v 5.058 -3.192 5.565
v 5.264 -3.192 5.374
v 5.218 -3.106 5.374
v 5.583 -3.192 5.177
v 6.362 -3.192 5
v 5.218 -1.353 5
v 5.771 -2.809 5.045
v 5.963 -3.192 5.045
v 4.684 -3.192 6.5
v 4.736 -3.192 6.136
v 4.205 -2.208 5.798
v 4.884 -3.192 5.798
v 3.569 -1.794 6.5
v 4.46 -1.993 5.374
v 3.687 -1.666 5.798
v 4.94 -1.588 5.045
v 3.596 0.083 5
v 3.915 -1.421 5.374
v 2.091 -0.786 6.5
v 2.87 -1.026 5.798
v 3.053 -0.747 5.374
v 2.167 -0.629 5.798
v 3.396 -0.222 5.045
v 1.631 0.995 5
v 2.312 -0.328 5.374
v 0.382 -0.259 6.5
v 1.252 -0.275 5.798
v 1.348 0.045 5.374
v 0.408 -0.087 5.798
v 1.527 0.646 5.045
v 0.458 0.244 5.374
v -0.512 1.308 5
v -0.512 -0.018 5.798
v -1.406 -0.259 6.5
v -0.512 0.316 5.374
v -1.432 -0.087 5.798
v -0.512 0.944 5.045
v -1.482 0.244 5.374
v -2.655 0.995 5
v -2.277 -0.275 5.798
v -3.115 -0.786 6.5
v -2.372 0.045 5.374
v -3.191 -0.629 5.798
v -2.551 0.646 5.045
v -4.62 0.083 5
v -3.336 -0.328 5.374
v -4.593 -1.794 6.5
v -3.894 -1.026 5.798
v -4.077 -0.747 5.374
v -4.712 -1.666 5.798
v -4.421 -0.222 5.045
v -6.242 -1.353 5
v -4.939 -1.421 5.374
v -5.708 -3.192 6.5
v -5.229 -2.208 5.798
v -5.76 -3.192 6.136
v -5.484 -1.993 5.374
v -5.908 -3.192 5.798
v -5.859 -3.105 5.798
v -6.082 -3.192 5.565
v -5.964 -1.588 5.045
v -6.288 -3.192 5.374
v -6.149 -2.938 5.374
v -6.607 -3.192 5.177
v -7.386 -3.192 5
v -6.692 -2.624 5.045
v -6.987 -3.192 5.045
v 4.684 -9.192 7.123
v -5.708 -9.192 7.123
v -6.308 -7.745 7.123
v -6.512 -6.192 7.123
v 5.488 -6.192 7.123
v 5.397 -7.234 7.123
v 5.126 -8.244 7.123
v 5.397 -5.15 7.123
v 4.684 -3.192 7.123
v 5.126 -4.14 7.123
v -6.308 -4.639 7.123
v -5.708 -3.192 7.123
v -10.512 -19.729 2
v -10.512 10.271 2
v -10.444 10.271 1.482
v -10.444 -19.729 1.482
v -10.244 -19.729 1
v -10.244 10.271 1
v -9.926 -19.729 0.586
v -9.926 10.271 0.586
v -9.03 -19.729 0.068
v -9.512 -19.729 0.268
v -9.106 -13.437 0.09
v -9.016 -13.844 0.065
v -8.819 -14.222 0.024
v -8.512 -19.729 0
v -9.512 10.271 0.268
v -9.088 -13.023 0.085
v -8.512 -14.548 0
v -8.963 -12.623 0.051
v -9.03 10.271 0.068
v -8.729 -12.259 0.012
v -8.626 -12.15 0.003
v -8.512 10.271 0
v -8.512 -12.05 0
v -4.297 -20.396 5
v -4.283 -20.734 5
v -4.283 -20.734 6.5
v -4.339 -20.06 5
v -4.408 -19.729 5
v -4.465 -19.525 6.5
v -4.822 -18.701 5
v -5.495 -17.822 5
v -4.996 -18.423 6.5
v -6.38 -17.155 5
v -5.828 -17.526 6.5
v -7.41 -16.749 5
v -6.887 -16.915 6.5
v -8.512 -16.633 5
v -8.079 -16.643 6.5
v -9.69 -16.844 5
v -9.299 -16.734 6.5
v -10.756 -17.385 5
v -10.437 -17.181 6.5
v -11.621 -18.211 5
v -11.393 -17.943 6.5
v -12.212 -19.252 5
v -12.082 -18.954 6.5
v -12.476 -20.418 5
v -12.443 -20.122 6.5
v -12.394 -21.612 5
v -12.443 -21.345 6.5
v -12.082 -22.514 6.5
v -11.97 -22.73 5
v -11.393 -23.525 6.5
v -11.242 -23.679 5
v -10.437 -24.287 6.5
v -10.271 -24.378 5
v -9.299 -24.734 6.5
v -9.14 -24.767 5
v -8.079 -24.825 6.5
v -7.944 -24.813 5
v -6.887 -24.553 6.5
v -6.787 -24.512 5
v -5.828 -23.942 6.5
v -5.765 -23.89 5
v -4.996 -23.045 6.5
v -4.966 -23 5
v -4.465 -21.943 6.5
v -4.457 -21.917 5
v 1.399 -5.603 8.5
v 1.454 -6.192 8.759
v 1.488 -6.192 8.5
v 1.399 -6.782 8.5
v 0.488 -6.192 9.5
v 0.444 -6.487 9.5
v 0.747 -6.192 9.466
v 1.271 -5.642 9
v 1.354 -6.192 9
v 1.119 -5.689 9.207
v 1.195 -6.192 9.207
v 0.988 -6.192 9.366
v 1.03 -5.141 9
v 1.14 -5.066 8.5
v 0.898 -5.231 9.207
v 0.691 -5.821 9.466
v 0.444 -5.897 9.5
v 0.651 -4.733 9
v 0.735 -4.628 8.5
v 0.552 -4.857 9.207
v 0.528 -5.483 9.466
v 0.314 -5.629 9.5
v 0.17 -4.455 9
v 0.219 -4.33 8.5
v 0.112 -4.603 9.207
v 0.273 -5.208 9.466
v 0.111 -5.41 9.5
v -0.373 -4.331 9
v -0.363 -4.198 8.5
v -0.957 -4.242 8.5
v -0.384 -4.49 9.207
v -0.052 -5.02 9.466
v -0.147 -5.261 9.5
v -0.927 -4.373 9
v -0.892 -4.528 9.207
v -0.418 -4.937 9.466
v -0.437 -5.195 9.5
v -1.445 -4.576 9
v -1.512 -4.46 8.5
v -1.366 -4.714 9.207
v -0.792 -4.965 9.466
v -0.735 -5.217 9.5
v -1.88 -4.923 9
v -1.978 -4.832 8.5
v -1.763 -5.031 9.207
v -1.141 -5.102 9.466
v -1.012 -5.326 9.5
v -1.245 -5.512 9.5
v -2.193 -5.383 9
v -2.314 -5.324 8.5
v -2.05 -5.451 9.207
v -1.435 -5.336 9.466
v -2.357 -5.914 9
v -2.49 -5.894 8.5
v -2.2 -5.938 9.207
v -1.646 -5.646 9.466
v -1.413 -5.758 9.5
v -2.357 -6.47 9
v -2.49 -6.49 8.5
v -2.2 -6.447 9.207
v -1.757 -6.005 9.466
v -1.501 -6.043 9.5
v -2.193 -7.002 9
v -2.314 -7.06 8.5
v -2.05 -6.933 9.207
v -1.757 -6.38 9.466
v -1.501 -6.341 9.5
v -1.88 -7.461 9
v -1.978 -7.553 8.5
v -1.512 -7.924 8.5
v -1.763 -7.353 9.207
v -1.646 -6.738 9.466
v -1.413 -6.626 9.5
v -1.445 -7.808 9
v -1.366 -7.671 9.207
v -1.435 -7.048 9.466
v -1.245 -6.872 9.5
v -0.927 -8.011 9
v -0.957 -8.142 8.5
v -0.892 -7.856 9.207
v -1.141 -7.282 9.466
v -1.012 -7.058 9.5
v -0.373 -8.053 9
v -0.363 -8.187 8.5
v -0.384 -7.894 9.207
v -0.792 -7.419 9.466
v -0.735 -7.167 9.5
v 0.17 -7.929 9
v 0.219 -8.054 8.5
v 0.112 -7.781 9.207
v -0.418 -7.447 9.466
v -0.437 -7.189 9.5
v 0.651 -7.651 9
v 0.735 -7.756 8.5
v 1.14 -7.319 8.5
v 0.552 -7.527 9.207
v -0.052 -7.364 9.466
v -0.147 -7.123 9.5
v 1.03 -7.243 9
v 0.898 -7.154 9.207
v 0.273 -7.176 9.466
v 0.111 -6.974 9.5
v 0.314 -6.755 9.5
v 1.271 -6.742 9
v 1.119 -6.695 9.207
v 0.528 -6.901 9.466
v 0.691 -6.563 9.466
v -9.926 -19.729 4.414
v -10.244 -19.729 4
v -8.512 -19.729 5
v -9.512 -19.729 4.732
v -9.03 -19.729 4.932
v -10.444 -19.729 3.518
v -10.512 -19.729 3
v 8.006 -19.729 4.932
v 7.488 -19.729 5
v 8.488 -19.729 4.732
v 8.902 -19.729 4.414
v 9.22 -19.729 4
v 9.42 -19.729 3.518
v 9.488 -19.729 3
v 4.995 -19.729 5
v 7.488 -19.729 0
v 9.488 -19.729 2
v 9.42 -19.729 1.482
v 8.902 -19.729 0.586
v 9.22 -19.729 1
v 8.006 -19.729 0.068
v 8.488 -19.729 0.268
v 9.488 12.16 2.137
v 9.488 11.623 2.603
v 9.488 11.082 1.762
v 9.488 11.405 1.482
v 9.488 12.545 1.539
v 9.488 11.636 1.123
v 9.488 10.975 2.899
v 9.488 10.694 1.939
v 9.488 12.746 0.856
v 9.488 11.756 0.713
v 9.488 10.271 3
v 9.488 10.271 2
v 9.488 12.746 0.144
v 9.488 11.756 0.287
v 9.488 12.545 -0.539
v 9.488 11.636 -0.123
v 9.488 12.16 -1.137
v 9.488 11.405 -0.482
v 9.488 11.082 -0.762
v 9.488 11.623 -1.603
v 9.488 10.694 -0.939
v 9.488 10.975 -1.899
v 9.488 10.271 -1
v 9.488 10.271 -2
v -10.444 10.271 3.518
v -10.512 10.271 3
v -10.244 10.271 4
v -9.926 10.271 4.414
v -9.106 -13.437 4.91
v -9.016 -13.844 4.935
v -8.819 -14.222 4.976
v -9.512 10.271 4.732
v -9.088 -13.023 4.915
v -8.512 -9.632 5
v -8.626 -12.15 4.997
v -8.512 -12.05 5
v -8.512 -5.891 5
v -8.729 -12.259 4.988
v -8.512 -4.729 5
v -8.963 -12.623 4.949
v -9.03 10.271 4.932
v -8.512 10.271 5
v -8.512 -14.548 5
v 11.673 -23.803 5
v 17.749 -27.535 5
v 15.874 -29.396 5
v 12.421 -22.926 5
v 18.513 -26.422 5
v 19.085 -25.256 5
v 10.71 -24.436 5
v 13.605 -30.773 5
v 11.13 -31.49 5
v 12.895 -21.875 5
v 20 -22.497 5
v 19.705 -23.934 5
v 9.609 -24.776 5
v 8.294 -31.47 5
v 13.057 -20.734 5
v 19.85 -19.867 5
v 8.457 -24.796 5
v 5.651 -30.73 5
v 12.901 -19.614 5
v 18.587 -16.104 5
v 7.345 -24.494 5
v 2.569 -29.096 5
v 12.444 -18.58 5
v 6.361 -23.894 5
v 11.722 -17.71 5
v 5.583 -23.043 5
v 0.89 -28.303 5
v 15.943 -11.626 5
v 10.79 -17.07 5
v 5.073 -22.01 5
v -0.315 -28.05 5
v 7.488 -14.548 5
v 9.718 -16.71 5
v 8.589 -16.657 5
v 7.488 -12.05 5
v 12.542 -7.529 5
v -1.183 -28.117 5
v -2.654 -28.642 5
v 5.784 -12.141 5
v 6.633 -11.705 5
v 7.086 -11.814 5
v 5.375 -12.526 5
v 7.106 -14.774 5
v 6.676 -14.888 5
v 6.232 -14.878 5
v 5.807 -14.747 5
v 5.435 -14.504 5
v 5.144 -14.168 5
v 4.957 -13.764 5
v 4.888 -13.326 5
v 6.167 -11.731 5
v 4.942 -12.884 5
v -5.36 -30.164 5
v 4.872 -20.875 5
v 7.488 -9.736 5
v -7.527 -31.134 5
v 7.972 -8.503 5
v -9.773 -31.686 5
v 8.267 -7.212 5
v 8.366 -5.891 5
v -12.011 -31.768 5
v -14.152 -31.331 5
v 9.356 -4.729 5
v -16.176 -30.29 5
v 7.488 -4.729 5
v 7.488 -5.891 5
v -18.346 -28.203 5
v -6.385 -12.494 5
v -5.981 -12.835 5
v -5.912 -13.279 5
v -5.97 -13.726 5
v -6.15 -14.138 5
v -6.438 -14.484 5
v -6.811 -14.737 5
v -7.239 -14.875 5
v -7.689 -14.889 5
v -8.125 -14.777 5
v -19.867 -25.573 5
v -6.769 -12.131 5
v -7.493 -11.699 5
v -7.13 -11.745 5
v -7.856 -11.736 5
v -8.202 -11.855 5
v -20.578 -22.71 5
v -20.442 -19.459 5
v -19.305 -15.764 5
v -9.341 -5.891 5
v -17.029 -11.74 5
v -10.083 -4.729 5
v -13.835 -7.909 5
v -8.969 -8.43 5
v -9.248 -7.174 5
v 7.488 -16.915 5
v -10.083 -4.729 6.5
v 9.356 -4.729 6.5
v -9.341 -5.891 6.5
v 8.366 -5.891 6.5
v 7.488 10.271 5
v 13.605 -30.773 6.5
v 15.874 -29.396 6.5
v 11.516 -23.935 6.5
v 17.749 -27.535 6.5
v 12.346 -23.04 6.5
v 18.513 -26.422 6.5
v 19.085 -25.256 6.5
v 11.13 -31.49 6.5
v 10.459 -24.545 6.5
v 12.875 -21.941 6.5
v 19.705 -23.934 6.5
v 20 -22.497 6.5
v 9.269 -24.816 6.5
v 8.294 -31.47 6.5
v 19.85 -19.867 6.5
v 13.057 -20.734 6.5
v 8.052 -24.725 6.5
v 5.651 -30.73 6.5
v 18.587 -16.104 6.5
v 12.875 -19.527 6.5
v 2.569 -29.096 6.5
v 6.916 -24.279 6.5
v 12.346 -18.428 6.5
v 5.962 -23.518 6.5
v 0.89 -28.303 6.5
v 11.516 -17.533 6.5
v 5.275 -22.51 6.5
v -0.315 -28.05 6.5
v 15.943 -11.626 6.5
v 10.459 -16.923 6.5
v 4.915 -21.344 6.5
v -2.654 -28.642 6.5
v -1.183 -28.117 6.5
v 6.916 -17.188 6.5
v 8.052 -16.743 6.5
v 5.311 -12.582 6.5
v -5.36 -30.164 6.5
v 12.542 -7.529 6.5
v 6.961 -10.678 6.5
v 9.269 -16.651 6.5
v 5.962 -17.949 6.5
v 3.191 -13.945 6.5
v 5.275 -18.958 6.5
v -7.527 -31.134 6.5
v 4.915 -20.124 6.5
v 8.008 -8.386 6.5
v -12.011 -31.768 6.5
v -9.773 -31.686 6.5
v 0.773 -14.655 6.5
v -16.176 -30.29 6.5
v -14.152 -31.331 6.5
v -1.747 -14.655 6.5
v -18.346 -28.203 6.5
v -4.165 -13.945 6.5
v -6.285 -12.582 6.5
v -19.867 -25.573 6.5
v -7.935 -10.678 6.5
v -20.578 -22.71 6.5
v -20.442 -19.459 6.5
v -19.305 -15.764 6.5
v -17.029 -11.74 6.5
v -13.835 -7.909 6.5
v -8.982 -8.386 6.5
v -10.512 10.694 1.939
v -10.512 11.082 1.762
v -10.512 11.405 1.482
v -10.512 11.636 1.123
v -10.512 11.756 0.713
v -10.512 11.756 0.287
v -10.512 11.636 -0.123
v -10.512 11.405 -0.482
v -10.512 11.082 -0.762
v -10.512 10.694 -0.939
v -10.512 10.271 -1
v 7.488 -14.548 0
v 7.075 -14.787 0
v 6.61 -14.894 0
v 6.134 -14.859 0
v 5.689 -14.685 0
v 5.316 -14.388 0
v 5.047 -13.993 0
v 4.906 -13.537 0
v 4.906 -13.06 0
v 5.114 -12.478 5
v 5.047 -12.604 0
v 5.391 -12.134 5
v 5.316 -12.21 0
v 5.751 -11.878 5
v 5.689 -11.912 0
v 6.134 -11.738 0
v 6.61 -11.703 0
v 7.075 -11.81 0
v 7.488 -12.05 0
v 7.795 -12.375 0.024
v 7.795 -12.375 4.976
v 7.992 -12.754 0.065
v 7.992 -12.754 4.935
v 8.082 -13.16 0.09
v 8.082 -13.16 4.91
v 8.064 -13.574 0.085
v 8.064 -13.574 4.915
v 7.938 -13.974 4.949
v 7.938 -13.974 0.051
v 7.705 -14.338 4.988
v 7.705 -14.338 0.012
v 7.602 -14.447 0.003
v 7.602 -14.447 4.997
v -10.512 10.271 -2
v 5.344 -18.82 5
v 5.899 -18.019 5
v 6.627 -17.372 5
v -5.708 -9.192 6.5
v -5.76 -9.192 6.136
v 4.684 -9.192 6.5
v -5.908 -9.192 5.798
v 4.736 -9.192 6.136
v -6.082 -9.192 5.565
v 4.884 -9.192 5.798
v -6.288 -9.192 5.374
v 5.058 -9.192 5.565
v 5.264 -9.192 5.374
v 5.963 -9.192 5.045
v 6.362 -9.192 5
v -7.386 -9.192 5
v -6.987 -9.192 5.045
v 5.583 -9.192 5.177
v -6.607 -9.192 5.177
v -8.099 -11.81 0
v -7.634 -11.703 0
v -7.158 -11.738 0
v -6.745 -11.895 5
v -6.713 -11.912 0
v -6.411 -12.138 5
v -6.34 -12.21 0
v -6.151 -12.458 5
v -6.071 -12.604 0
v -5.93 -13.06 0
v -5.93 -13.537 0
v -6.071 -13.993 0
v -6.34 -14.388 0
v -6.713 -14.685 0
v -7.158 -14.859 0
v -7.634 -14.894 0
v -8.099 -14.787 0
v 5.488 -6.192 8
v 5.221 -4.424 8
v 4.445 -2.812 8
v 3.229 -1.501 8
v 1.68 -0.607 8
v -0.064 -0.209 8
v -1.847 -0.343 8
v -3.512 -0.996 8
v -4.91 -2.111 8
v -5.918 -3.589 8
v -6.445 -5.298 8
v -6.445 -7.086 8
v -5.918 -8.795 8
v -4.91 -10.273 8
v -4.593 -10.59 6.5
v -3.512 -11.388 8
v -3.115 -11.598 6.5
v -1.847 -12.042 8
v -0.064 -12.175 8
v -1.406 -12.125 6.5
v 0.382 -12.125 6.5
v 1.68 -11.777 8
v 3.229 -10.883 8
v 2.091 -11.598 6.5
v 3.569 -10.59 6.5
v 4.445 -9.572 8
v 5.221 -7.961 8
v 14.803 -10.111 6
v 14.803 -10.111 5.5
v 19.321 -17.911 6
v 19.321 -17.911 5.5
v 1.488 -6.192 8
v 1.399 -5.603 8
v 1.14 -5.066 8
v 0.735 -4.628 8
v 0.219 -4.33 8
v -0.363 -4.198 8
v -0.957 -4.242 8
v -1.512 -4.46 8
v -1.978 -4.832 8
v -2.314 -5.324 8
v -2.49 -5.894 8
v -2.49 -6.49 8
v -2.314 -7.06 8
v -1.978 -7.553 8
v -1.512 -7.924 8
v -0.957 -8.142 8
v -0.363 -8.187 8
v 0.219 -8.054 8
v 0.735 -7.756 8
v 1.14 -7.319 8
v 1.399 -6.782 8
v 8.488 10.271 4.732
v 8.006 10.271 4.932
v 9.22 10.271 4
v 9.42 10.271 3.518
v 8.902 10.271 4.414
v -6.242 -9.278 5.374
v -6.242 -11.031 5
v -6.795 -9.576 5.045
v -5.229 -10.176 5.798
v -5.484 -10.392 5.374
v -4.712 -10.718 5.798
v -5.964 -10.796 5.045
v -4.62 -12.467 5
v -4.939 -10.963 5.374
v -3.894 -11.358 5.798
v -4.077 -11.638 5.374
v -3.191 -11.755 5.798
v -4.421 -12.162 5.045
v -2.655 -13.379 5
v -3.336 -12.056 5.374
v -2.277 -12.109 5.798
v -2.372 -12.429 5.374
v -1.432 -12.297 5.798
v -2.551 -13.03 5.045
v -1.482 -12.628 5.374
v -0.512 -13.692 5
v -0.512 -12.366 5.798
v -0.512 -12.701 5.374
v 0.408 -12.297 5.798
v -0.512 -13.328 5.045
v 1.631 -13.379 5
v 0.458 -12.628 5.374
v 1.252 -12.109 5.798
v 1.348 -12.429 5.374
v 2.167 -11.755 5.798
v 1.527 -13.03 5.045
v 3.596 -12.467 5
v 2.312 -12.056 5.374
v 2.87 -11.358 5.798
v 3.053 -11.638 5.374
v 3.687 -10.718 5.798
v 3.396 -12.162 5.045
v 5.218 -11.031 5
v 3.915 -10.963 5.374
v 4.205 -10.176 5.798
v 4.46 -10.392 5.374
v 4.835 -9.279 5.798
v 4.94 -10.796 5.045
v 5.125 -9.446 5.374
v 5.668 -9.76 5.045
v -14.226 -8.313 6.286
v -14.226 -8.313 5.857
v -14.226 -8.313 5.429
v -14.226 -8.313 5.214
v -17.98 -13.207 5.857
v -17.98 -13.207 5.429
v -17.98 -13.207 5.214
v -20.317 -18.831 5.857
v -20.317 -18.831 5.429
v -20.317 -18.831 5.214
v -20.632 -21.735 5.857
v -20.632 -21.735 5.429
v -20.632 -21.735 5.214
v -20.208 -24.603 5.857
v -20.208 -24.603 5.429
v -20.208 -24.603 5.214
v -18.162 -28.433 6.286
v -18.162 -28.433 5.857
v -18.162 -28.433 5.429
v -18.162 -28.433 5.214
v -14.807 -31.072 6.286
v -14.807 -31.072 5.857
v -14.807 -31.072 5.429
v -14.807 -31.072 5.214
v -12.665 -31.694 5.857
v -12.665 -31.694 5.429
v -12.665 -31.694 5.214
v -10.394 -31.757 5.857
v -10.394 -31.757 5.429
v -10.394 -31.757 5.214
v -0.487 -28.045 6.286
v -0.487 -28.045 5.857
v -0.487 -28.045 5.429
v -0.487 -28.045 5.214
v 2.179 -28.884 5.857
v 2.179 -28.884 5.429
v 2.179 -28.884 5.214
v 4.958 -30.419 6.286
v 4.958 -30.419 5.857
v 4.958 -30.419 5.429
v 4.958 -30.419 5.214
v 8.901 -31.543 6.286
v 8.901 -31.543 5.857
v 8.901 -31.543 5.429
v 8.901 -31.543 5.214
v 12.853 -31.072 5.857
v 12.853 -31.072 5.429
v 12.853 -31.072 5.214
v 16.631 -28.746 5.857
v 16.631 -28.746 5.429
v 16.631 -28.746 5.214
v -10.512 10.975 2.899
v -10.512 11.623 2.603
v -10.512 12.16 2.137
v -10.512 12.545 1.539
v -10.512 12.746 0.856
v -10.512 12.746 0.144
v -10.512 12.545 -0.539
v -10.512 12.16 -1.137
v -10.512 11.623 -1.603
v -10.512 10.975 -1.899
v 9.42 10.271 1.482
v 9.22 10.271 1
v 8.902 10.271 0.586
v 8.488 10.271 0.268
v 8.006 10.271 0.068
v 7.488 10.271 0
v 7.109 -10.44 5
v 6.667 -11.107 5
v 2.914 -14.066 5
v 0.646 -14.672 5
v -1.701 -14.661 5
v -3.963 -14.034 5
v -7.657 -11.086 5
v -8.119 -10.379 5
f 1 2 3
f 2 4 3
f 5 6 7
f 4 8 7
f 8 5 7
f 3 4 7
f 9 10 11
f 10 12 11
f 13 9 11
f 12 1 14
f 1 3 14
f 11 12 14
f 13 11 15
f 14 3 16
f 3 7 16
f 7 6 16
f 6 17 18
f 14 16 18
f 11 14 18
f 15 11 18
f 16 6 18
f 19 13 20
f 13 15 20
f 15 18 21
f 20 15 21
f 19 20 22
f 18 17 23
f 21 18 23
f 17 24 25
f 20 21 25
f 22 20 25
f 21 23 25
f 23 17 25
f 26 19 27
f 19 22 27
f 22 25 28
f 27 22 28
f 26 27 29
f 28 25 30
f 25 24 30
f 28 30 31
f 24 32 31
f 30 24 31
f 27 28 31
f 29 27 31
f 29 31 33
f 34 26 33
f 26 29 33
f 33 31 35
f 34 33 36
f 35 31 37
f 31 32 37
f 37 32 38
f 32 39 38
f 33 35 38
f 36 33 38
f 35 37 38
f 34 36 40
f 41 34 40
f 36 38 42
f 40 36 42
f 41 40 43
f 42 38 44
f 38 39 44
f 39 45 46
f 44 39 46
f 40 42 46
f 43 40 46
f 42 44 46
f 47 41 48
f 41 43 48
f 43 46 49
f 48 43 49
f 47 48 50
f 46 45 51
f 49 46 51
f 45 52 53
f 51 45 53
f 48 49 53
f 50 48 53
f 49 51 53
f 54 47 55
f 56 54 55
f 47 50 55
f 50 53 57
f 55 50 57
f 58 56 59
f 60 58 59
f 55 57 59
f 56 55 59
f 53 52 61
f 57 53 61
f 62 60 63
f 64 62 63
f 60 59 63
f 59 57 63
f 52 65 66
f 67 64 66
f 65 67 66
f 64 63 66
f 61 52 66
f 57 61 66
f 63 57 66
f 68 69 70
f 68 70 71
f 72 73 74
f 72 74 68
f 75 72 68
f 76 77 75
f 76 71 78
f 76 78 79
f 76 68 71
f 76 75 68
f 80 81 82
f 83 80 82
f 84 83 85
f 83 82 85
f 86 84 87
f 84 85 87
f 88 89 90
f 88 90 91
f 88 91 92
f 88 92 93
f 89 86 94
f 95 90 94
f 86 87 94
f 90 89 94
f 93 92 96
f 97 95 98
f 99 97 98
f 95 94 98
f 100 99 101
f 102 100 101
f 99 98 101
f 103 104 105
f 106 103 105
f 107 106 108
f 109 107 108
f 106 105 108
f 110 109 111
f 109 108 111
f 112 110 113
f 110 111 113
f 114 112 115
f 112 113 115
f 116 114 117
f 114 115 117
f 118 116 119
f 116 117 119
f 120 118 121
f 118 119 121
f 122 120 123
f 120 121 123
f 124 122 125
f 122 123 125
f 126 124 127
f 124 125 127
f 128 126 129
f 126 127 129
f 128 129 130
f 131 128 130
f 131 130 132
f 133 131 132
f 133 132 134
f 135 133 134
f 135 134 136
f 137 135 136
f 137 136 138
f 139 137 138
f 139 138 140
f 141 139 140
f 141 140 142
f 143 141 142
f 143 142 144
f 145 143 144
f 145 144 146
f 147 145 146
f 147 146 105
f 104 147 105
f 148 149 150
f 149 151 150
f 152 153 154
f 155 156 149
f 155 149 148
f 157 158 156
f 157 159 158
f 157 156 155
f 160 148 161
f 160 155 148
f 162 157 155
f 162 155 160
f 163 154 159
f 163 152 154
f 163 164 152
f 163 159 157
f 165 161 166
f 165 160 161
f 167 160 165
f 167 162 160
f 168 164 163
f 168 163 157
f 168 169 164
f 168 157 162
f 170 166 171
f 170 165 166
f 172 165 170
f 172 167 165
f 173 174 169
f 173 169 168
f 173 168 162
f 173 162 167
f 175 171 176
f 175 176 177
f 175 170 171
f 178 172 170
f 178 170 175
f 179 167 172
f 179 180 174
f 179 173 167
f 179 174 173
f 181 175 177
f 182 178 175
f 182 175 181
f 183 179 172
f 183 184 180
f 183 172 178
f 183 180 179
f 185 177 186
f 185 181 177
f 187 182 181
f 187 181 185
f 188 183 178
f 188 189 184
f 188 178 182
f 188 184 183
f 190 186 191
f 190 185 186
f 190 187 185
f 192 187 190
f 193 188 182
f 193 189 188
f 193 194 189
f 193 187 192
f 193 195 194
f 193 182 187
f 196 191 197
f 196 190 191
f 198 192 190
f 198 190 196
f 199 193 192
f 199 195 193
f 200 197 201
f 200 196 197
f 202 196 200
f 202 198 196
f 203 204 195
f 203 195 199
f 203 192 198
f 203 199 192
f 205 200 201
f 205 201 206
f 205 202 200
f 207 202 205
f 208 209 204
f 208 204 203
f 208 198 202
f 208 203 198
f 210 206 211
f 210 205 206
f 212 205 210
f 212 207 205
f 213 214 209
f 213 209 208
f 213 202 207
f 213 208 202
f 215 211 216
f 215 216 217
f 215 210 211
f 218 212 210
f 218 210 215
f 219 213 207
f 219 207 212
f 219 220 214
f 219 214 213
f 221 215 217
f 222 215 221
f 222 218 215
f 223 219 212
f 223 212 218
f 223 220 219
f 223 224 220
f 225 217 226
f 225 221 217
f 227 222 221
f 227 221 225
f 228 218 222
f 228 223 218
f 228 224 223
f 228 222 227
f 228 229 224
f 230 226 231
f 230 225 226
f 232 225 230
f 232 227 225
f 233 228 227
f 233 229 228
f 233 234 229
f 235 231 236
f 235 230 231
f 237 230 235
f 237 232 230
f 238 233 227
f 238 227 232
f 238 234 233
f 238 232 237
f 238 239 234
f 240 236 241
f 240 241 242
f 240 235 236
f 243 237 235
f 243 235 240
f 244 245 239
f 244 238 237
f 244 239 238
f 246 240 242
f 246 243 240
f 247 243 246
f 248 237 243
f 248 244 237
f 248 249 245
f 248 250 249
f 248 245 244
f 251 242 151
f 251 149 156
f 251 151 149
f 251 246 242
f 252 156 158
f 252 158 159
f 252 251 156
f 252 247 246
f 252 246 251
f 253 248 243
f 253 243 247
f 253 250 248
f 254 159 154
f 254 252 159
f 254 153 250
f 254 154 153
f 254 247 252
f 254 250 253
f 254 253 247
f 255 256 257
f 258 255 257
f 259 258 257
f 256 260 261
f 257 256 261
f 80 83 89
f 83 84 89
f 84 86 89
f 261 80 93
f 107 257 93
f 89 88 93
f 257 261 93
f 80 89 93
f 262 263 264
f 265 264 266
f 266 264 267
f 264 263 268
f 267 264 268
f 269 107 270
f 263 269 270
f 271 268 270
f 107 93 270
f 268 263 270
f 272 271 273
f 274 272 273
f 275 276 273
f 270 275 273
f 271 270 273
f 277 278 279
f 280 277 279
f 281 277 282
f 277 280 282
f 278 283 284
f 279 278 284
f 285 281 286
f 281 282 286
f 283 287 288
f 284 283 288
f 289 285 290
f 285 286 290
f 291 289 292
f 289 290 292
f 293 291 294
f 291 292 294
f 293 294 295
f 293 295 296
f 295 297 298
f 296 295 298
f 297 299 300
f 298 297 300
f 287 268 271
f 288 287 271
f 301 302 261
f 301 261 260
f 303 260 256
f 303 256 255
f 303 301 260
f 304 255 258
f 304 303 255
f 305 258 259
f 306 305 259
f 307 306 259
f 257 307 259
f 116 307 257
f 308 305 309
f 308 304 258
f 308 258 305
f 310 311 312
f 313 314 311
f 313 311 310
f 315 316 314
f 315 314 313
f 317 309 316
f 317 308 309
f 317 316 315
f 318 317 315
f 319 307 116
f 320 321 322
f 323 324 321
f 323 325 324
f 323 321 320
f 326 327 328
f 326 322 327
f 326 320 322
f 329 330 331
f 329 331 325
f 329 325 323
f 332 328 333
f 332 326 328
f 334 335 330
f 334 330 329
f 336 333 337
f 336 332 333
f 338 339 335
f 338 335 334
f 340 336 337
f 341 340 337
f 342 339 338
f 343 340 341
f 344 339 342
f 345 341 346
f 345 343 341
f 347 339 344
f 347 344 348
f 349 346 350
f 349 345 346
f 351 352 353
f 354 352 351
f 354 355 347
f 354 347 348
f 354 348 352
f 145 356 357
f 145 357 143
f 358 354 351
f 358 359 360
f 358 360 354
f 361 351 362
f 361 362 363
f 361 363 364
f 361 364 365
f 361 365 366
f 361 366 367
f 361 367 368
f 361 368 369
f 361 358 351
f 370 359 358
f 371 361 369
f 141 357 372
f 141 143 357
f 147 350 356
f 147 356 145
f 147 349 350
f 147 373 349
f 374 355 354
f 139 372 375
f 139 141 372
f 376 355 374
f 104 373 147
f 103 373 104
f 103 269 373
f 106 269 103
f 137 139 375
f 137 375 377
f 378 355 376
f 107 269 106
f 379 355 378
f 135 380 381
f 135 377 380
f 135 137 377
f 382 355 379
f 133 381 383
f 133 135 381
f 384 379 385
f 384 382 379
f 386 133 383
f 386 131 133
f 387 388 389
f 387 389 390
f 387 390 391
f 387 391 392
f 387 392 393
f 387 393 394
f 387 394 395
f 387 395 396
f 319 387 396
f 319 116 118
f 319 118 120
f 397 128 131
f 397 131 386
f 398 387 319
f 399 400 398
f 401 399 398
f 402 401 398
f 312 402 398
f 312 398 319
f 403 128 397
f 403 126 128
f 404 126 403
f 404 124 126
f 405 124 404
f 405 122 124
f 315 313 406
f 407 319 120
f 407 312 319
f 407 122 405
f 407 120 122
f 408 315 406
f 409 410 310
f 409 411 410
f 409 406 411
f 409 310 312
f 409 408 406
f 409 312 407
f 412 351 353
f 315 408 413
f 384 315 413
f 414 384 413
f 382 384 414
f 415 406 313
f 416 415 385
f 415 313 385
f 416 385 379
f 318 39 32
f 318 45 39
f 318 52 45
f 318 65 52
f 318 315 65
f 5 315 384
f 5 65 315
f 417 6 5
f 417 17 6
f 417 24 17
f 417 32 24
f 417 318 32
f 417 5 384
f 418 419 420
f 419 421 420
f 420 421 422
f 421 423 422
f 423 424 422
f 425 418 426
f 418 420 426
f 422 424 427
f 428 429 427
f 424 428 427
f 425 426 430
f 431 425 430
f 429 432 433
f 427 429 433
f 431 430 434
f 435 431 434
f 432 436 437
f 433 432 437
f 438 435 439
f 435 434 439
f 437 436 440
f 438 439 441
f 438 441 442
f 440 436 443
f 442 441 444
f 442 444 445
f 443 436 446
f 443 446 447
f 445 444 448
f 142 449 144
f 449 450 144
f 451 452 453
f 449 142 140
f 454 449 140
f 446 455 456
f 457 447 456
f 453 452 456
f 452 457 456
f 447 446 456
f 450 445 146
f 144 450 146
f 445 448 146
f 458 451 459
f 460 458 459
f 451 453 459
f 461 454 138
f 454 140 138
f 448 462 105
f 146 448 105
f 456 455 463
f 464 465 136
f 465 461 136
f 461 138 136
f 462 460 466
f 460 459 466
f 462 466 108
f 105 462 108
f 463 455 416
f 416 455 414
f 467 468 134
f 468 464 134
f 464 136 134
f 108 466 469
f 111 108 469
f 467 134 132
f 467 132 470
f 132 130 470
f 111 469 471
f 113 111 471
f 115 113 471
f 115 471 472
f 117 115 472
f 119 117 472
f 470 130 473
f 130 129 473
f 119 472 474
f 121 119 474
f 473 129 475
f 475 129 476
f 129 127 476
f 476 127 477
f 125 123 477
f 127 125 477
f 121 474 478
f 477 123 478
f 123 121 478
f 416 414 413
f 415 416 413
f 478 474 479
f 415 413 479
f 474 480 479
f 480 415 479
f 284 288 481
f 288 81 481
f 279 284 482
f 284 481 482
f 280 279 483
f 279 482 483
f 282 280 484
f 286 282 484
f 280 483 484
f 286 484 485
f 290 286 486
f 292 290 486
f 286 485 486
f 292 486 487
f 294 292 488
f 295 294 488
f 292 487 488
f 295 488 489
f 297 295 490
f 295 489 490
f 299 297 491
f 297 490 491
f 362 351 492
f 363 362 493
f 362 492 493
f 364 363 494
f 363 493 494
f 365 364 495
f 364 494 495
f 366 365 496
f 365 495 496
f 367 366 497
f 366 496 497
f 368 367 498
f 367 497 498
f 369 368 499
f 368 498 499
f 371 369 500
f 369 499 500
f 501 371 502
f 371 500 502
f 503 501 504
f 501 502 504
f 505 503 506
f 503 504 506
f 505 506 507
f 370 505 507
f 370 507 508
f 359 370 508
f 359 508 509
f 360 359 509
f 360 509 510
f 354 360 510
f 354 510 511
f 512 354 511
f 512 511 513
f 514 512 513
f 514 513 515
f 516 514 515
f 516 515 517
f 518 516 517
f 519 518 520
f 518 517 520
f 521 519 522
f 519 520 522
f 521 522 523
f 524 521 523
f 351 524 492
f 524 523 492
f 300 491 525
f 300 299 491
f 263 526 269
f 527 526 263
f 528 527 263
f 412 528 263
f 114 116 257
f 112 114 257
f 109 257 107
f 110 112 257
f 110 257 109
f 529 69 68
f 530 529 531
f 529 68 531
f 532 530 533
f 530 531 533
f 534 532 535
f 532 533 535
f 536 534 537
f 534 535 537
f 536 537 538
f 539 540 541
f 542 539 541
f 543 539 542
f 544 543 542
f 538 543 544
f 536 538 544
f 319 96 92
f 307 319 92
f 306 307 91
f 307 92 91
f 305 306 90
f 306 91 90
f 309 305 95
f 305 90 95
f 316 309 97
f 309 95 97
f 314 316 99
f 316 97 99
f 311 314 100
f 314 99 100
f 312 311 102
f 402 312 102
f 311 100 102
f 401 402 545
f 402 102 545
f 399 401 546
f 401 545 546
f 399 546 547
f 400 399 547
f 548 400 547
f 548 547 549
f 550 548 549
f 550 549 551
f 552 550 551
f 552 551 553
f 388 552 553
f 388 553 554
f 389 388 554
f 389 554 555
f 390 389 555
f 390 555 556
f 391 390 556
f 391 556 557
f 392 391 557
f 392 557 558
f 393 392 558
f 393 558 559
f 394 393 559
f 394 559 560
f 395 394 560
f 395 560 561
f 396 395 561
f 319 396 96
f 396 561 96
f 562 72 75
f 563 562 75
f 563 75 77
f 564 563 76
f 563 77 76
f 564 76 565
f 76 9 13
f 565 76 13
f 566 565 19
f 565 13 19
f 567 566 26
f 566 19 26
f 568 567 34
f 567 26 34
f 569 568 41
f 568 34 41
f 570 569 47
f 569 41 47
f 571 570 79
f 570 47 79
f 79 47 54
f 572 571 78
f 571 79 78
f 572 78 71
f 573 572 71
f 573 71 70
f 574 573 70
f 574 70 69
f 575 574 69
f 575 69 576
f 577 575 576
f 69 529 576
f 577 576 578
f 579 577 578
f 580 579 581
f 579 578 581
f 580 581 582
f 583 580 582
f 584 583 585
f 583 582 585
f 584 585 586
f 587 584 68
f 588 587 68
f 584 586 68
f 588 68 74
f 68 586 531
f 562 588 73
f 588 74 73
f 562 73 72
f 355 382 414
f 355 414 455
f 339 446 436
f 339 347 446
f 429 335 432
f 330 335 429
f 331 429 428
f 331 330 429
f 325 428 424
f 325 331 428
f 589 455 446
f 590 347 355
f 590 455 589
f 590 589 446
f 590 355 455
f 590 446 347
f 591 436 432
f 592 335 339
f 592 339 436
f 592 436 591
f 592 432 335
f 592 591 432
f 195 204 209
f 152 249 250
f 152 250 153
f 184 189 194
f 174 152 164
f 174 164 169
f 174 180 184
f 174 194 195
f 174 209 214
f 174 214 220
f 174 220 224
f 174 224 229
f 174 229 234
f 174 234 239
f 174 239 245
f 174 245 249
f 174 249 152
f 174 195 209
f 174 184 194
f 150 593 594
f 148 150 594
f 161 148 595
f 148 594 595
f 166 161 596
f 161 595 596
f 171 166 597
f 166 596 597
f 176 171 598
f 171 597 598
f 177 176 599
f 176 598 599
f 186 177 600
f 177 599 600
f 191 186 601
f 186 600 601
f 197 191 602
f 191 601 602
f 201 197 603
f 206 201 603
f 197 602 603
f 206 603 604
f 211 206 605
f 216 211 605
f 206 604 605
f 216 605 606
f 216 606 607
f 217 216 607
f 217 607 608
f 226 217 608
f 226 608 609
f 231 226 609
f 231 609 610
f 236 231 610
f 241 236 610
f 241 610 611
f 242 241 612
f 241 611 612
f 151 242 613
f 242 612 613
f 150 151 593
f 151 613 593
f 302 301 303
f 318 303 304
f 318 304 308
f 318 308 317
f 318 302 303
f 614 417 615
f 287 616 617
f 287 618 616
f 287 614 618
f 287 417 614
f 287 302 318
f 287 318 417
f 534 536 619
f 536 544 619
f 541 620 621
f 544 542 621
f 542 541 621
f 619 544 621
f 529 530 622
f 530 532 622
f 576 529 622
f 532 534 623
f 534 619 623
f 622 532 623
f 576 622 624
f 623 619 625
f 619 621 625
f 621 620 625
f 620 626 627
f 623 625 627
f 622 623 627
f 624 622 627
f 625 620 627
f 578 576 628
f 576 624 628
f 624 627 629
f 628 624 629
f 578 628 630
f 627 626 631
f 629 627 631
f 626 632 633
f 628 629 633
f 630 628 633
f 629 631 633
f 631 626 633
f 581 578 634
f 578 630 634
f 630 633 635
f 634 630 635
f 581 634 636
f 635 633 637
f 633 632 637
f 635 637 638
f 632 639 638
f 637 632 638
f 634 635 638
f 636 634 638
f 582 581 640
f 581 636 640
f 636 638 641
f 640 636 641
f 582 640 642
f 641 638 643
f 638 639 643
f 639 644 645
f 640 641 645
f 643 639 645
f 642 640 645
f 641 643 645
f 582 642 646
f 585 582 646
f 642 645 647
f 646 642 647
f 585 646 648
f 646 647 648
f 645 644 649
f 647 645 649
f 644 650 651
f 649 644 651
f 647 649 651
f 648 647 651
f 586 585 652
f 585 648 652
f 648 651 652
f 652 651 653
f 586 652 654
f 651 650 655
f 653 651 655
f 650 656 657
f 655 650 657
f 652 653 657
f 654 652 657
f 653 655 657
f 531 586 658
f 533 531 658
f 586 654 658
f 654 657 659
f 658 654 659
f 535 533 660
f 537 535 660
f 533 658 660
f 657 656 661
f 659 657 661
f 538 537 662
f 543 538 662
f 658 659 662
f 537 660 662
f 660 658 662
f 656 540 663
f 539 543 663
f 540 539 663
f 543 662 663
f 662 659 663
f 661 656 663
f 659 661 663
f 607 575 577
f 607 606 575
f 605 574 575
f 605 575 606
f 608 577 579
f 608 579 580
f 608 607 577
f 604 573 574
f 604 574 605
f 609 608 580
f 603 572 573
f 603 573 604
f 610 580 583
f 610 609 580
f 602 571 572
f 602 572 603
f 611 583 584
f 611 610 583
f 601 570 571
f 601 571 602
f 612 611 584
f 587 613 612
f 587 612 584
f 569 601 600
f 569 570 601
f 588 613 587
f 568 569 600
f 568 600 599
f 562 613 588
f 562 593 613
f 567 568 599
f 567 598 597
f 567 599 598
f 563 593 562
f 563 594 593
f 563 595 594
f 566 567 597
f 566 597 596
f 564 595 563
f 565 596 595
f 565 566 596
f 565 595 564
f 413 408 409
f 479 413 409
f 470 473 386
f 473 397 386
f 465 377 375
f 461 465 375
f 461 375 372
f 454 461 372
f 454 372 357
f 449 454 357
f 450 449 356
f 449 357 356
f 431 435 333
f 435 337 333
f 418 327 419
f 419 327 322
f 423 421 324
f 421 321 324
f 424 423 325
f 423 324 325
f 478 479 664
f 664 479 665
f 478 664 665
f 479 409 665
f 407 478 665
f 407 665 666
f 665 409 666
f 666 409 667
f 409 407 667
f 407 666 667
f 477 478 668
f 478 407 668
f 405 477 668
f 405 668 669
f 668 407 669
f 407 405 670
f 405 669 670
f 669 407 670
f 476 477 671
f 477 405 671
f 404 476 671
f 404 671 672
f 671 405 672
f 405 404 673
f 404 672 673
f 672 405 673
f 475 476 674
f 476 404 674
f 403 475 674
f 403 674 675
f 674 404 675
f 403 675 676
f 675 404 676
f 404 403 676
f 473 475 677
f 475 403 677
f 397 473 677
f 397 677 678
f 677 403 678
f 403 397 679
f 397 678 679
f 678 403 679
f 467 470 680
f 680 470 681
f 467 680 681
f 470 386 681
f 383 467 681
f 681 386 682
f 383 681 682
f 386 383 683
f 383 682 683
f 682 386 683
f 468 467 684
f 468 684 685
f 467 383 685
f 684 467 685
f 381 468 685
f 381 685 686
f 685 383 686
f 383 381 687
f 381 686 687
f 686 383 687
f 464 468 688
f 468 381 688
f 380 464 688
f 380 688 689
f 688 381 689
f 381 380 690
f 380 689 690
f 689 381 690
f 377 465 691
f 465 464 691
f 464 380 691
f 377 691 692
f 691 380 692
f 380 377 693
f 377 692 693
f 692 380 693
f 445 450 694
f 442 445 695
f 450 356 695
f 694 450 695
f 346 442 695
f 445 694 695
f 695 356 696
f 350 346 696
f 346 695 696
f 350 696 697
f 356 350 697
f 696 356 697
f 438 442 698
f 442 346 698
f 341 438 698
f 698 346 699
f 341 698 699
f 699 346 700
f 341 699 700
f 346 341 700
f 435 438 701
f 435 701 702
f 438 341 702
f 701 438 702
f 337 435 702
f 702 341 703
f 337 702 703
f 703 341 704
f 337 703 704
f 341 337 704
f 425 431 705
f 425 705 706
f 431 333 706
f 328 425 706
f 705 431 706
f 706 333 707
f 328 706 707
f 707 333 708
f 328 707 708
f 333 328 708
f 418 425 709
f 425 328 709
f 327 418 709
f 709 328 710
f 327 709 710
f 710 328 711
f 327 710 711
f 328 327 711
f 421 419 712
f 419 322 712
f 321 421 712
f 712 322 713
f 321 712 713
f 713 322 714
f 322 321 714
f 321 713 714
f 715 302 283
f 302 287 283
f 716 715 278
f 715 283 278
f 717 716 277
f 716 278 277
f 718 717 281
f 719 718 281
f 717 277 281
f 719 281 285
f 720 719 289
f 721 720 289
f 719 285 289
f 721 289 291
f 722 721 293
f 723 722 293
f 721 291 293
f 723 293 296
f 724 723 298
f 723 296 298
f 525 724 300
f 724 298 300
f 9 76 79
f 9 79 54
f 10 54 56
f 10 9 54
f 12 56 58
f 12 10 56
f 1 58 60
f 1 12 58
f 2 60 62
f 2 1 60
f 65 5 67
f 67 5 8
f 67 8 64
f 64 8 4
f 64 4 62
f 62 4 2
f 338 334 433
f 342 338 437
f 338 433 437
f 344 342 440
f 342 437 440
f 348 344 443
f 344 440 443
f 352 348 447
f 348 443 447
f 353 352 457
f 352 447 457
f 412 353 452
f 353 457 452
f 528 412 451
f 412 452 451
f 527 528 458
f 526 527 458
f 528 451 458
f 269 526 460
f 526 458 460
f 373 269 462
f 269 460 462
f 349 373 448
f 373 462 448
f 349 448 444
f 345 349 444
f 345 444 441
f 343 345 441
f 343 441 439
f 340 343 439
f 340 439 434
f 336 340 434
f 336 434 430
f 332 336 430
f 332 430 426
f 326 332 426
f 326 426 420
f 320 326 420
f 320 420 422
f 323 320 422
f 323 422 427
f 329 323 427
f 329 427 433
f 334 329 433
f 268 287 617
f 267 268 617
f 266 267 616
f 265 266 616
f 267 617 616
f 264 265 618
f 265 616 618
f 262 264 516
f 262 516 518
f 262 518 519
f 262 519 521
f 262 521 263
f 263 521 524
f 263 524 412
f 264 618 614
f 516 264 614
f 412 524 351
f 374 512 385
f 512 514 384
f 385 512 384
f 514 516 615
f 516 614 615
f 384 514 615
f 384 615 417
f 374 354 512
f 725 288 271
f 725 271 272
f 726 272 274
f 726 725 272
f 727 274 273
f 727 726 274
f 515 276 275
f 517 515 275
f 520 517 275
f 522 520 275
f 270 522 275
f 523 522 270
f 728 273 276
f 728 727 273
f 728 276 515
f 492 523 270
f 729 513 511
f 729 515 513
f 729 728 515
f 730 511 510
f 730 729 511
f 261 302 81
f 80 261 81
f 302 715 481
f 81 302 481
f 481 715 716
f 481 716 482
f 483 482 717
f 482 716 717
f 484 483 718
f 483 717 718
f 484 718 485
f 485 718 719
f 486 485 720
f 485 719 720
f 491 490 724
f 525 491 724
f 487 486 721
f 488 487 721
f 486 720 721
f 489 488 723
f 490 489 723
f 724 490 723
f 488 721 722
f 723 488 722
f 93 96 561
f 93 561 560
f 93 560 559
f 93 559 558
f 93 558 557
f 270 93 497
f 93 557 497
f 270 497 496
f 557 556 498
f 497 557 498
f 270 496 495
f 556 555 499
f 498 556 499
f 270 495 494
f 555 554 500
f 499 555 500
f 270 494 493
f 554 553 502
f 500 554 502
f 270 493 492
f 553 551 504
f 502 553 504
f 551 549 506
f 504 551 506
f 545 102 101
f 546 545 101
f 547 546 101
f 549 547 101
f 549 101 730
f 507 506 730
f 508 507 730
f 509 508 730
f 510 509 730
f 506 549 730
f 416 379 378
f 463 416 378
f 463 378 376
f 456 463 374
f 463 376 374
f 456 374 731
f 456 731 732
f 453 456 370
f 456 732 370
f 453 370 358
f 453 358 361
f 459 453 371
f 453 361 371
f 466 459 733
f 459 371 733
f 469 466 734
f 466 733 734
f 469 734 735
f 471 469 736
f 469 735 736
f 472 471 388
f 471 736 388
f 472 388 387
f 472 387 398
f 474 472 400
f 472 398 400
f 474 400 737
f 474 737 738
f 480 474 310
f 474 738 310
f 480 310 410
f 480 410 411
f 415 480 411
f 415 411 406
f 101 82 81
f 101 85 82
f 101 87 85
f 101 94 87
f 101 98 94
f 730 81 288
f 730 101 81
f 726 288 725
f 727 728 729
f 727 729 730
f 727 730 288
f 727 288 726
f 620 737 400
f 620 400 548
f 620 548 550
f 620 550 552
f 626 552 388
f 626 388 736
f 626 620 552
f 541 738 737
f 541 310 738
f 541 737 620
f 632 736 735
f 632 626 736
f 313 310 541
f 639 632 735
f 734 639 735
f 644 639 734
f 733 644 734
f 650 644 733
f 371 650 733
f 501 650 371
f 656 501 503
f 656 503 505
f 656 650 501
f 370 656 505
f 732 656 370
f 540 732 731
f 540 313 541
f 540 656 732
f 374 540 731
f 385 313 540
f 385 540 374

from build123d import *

# Parameters (mm, degrees)
SKETCH_1_W          = 20
SKETCH_1_H          = 30
EXTRUDE_1_DEPTH     = 5
FILLET_1_R          = 2
SKETCH_3_R          = 6
EXTRUDE_2_DEPTH     = 3
SKETCH_6_R          = 2
EXTRUDE_3_DEPTH     = 1.5
FILLET_2_R          = 1
FILLET_3_R          = 1.5
CUT_EXTRUDE_2_REACH = 26.29
SKETCH_8_W          = 2.123495481
SKETCH_8_H          = 6
EXTRUDE_4_DEPTH     = 1.5
SKETCH_11_R         = 4.102803396
SKETCH_11_R_2       = 4.093881939
CUT_EXTRUDE_4_DEPTH = 1.5
CUT_EXTRUDE_5_REACH = 41.076
SKETCH_12_R         = 1.6
SKETCH_15_W         = 20
SKETCH_15_H         = 1


with BuildPart() as part:
    # 草图1 → 凸台-拉伸1 (new body)
    with BuildSketch(Plane.XY):
        with Locations((-0.512048193, -4.728915663)):
            Rectangle(SKETCH_1_W, SKETCH_1_H)
    extrude(amount=EXTRUDE_1_DEPTH)

    # 圆角1
    fillet_1_edges = [part.edges().sort_by_distance(p)[0] for p in [
        (9.487951807, -4.728915663, 5),
        (-10.512048193, -4.728915663, 5),
        (9.487951807, -4.728915663, 0),
        (-10.512048193, -4.728915663, 0),
    ]]
    fillet(fillet_1_edges, radius=FILLET_1_R)

    # 草图3 → 凸台-拉伸2 (add)
    with BuildSketch(Plane.XY.offset(5)):
        with Locations((-0.512048193, -6.192161846)):
            Circle(SKETCH_3_R)
    extrude(amount=EXTRUDE_2_DEPTH)

    # 草图6 → 凸台-拉伸3 (add)
    with BuildSketch(Plane.XY.offset(8)):
        with Locations((-0.512048193, -6.192161846)):
            Circle(SKETCH_6_R)
    extrude(amount=EXTRUDE_3_DEPTH)

    # 圆角2
    fillet_2_edges = [part.edges().sort_by_distance(p)[0] for p in [
        (-2.512048193, -6.192161846, 9.5),
    ]]
    fillet(fillet_2_edges, radius=FILLET_2_R)

    # 圆角3
    fillet_3_edges = [part.edges().sort_by_distance(p)[0] for p in [
        (-6.512048193, -6.192161846, 5),
    ]]
    fillet(fillet_3_edges, radius=FILLET_3_R)

    # 草图8 → 切除-拉伸2 (cut, up to next)
    with BuildSketch(Plane(origin=(0, 0, 0), x_dir=(0, 0, -1), z_dir=(1, 0, 0)), mode=Mode.PRIVATE) as cut_extrude_2_sk1:
        with Locations((-6.061747741, -6.192161846)):
            Rectangle(SKETCH_8_W, SKETCH_8_H)
    cut_extrude_2_tool1 = extrude(cut_extrude_2_sk1.sketch, amount=-CUT_EXTRUDE_2_REACH, mode=Mode.PRIVATE) & part.part
    cut_extrude_2 = cut_extrude_2_tool1.solids().sort_by_distance((0, -6.192162, 6.061748))[0]
    add(cut_extrude_2, mode=Mode.SUBTRACT)

    # 镜向1: 切除-拉伸2 across plane
    add(cut_extrude_2.mirror(Plane(origin=(0, 0, 0), x_dir=(0, 0, 1), z_dir=(1, 0, 0))), mode=Mode.SUBTRACT)

    # 草图10 → 凸台-拉伸4 (add)
    with BuildSketch(Plane.XY.offset(5)):
        with BuildLine():
            Line((-9.340987134, -4.728915663), (9.355589447, -4.728915663))
            add(Edge.make_bspline(
                [(9.355589447, -4.728915663), (13.992546716, -7.945382006), (22.972097945, -19.096110537), (19.084733928, -25.255580428)],
                knots=[0, 0, 0, 0, 0.887388337, 0.887388337, 0.887388337, 0.887388337], degree=3))
            add(Edge.make_bspline(
                [(-10.082914776, -4.728915663), (-15.408926962, -8.375968451), (-24.994806931, -20.22138181), (-15.197101736, -32.678561916), (-6.587465976, -31.626421296), (-0.477412243, -26.61445571), (5.414794623, -31.424474746), (13.293093494, -32.294100029), (18.097699513, -27.767163892), (19.084733928, -25.255580428)],
                knots=[0, 0, 0, 0, 0.234068199, 0.319051753, 0.409665551, 0.46874826, 0.52865283, 0.608525839, 0.694487997, 0.694487997, 0.694487997, 0.694487997], degree=3))
            Line((-10.082914776, -4.728915663), (-9.340987134, -4.728915663))
        make_face()
        with BuildLine():
            Line((-9.340987134, -5.891268969), (8.366352591, -5.891268969))
            ThreePointArc((8.366352591, -5.891268969), (-0.487317271, -14.744938831), (-9.340987134, -5.891268969))
        make_face(mode=Mode.SUBTRACT)
    extrude(amount=EXTRUDE_4_DEPTH)

    # 草图11 → 切除-拉伸4 (cut)
    with BuildSketch(Plane.XY.offset(6.5)):
        with Locations((-8.385806573, -20.733892602)):
            Circle(SKETCH_11_R)
        with Locations((8.963204082, -20.733892602)):
            Circle(SKETCH_11_R_2)
    extrude(amount=-CUT_EXTRUDE_4_DEPTH, mode=Mode.SUBTRACT)

    # 切除-拉伸5: up to this face of the body (flat: up to its plane)
    cut_extrude_5_end = Plane(part.part.faces().sort_by_distance((-0.492684215, -8.944423167, 5))[0])
    # 草图12 → 切除-拉伸5 (cut, up to the picked face)
    with BuildSketch(Plane(origin=(0, 0, 0), x_dir=(-1, 0, 0), z_dir=(0, 0, -1)), mode=Mode.PRIVATE) as cut_extrude_5_sk1:
        with Locations(Location((-6.487951807, -13.298602321, 0), (0, 0, 231.317812547))):
            Circle(SKETCH_12_R)
    cut_extrude_5_tool1 = split(extrude(cut_extrude_5_sk1.sketch, amount=-CUT_EXTRUDE_5_REACH, mode=Mode.PRIVATE), bisect_by=cut_extrude_5_end, keep=Keep.BOTH, mode=Mode.PRIVATE)
    # 草图12 → 切除-拉伸5 (cut, up to the picked face)
    with BuildSketch(Plane(origin=(0, 0, 0), x_dir=(-1, 0, 0), z_dir=(0, 0, -1)), mode=Mode.PRIVATE) as cut_extrude_5_sk2:
        with Locations(Location((7.512048193, -13.298602321, 0), (0, 0, 308.682187453))):
            Circle(SKETCH_12_R)
    cut_extrude_5_tool2 = split(extrude(cut_extrude_5_sk2.sketch, amount=-CUT_EXTRUDE_5_REACH, mode=Mode.PRIVATE), bisect_by=cut_extrude_5_end, keep=Keep.BOTH, mode=Mode.PRIVATE)
    add(cut_extrude_5_tool1.solids().sort_by(Axis((6.487952, -13.298602, 0), (0, 0, 1)))[0], mode=Mode.SUBTRACT)
    add(cut_extrude_5_tool2.solids().sort_by(Axis((-7.512048, -13.298602, 0), (0, 0, 1)))[0], mode=Mode.SUBTRACT)

    # 扫描1: sweep along a path in 草图14
    with BuildLine(Plane(origin=(0, 0, 0), x_dir=(0, 0, -1), z_dir=(1, 0, 0))) as sweep_1_path:
        ThreePointArc((-2.5, 10.271084337), (-0.5, 12.271084337), (1.5, 10.271084337))
    # 草图15 → 扫描1 (sweep)
    with BuildSketch(Plane(origin=(0, 10.271084337, 0), x_dir=(1, 0, 0), z_dir=(0, 1, 0))):
        with Locations((-0.512048193, -2.5)):
            Rectangle(SKETCH_15_W, SKETCH_15_H)
    sweep(path=sweep_1_path.line)


solid = part.part
